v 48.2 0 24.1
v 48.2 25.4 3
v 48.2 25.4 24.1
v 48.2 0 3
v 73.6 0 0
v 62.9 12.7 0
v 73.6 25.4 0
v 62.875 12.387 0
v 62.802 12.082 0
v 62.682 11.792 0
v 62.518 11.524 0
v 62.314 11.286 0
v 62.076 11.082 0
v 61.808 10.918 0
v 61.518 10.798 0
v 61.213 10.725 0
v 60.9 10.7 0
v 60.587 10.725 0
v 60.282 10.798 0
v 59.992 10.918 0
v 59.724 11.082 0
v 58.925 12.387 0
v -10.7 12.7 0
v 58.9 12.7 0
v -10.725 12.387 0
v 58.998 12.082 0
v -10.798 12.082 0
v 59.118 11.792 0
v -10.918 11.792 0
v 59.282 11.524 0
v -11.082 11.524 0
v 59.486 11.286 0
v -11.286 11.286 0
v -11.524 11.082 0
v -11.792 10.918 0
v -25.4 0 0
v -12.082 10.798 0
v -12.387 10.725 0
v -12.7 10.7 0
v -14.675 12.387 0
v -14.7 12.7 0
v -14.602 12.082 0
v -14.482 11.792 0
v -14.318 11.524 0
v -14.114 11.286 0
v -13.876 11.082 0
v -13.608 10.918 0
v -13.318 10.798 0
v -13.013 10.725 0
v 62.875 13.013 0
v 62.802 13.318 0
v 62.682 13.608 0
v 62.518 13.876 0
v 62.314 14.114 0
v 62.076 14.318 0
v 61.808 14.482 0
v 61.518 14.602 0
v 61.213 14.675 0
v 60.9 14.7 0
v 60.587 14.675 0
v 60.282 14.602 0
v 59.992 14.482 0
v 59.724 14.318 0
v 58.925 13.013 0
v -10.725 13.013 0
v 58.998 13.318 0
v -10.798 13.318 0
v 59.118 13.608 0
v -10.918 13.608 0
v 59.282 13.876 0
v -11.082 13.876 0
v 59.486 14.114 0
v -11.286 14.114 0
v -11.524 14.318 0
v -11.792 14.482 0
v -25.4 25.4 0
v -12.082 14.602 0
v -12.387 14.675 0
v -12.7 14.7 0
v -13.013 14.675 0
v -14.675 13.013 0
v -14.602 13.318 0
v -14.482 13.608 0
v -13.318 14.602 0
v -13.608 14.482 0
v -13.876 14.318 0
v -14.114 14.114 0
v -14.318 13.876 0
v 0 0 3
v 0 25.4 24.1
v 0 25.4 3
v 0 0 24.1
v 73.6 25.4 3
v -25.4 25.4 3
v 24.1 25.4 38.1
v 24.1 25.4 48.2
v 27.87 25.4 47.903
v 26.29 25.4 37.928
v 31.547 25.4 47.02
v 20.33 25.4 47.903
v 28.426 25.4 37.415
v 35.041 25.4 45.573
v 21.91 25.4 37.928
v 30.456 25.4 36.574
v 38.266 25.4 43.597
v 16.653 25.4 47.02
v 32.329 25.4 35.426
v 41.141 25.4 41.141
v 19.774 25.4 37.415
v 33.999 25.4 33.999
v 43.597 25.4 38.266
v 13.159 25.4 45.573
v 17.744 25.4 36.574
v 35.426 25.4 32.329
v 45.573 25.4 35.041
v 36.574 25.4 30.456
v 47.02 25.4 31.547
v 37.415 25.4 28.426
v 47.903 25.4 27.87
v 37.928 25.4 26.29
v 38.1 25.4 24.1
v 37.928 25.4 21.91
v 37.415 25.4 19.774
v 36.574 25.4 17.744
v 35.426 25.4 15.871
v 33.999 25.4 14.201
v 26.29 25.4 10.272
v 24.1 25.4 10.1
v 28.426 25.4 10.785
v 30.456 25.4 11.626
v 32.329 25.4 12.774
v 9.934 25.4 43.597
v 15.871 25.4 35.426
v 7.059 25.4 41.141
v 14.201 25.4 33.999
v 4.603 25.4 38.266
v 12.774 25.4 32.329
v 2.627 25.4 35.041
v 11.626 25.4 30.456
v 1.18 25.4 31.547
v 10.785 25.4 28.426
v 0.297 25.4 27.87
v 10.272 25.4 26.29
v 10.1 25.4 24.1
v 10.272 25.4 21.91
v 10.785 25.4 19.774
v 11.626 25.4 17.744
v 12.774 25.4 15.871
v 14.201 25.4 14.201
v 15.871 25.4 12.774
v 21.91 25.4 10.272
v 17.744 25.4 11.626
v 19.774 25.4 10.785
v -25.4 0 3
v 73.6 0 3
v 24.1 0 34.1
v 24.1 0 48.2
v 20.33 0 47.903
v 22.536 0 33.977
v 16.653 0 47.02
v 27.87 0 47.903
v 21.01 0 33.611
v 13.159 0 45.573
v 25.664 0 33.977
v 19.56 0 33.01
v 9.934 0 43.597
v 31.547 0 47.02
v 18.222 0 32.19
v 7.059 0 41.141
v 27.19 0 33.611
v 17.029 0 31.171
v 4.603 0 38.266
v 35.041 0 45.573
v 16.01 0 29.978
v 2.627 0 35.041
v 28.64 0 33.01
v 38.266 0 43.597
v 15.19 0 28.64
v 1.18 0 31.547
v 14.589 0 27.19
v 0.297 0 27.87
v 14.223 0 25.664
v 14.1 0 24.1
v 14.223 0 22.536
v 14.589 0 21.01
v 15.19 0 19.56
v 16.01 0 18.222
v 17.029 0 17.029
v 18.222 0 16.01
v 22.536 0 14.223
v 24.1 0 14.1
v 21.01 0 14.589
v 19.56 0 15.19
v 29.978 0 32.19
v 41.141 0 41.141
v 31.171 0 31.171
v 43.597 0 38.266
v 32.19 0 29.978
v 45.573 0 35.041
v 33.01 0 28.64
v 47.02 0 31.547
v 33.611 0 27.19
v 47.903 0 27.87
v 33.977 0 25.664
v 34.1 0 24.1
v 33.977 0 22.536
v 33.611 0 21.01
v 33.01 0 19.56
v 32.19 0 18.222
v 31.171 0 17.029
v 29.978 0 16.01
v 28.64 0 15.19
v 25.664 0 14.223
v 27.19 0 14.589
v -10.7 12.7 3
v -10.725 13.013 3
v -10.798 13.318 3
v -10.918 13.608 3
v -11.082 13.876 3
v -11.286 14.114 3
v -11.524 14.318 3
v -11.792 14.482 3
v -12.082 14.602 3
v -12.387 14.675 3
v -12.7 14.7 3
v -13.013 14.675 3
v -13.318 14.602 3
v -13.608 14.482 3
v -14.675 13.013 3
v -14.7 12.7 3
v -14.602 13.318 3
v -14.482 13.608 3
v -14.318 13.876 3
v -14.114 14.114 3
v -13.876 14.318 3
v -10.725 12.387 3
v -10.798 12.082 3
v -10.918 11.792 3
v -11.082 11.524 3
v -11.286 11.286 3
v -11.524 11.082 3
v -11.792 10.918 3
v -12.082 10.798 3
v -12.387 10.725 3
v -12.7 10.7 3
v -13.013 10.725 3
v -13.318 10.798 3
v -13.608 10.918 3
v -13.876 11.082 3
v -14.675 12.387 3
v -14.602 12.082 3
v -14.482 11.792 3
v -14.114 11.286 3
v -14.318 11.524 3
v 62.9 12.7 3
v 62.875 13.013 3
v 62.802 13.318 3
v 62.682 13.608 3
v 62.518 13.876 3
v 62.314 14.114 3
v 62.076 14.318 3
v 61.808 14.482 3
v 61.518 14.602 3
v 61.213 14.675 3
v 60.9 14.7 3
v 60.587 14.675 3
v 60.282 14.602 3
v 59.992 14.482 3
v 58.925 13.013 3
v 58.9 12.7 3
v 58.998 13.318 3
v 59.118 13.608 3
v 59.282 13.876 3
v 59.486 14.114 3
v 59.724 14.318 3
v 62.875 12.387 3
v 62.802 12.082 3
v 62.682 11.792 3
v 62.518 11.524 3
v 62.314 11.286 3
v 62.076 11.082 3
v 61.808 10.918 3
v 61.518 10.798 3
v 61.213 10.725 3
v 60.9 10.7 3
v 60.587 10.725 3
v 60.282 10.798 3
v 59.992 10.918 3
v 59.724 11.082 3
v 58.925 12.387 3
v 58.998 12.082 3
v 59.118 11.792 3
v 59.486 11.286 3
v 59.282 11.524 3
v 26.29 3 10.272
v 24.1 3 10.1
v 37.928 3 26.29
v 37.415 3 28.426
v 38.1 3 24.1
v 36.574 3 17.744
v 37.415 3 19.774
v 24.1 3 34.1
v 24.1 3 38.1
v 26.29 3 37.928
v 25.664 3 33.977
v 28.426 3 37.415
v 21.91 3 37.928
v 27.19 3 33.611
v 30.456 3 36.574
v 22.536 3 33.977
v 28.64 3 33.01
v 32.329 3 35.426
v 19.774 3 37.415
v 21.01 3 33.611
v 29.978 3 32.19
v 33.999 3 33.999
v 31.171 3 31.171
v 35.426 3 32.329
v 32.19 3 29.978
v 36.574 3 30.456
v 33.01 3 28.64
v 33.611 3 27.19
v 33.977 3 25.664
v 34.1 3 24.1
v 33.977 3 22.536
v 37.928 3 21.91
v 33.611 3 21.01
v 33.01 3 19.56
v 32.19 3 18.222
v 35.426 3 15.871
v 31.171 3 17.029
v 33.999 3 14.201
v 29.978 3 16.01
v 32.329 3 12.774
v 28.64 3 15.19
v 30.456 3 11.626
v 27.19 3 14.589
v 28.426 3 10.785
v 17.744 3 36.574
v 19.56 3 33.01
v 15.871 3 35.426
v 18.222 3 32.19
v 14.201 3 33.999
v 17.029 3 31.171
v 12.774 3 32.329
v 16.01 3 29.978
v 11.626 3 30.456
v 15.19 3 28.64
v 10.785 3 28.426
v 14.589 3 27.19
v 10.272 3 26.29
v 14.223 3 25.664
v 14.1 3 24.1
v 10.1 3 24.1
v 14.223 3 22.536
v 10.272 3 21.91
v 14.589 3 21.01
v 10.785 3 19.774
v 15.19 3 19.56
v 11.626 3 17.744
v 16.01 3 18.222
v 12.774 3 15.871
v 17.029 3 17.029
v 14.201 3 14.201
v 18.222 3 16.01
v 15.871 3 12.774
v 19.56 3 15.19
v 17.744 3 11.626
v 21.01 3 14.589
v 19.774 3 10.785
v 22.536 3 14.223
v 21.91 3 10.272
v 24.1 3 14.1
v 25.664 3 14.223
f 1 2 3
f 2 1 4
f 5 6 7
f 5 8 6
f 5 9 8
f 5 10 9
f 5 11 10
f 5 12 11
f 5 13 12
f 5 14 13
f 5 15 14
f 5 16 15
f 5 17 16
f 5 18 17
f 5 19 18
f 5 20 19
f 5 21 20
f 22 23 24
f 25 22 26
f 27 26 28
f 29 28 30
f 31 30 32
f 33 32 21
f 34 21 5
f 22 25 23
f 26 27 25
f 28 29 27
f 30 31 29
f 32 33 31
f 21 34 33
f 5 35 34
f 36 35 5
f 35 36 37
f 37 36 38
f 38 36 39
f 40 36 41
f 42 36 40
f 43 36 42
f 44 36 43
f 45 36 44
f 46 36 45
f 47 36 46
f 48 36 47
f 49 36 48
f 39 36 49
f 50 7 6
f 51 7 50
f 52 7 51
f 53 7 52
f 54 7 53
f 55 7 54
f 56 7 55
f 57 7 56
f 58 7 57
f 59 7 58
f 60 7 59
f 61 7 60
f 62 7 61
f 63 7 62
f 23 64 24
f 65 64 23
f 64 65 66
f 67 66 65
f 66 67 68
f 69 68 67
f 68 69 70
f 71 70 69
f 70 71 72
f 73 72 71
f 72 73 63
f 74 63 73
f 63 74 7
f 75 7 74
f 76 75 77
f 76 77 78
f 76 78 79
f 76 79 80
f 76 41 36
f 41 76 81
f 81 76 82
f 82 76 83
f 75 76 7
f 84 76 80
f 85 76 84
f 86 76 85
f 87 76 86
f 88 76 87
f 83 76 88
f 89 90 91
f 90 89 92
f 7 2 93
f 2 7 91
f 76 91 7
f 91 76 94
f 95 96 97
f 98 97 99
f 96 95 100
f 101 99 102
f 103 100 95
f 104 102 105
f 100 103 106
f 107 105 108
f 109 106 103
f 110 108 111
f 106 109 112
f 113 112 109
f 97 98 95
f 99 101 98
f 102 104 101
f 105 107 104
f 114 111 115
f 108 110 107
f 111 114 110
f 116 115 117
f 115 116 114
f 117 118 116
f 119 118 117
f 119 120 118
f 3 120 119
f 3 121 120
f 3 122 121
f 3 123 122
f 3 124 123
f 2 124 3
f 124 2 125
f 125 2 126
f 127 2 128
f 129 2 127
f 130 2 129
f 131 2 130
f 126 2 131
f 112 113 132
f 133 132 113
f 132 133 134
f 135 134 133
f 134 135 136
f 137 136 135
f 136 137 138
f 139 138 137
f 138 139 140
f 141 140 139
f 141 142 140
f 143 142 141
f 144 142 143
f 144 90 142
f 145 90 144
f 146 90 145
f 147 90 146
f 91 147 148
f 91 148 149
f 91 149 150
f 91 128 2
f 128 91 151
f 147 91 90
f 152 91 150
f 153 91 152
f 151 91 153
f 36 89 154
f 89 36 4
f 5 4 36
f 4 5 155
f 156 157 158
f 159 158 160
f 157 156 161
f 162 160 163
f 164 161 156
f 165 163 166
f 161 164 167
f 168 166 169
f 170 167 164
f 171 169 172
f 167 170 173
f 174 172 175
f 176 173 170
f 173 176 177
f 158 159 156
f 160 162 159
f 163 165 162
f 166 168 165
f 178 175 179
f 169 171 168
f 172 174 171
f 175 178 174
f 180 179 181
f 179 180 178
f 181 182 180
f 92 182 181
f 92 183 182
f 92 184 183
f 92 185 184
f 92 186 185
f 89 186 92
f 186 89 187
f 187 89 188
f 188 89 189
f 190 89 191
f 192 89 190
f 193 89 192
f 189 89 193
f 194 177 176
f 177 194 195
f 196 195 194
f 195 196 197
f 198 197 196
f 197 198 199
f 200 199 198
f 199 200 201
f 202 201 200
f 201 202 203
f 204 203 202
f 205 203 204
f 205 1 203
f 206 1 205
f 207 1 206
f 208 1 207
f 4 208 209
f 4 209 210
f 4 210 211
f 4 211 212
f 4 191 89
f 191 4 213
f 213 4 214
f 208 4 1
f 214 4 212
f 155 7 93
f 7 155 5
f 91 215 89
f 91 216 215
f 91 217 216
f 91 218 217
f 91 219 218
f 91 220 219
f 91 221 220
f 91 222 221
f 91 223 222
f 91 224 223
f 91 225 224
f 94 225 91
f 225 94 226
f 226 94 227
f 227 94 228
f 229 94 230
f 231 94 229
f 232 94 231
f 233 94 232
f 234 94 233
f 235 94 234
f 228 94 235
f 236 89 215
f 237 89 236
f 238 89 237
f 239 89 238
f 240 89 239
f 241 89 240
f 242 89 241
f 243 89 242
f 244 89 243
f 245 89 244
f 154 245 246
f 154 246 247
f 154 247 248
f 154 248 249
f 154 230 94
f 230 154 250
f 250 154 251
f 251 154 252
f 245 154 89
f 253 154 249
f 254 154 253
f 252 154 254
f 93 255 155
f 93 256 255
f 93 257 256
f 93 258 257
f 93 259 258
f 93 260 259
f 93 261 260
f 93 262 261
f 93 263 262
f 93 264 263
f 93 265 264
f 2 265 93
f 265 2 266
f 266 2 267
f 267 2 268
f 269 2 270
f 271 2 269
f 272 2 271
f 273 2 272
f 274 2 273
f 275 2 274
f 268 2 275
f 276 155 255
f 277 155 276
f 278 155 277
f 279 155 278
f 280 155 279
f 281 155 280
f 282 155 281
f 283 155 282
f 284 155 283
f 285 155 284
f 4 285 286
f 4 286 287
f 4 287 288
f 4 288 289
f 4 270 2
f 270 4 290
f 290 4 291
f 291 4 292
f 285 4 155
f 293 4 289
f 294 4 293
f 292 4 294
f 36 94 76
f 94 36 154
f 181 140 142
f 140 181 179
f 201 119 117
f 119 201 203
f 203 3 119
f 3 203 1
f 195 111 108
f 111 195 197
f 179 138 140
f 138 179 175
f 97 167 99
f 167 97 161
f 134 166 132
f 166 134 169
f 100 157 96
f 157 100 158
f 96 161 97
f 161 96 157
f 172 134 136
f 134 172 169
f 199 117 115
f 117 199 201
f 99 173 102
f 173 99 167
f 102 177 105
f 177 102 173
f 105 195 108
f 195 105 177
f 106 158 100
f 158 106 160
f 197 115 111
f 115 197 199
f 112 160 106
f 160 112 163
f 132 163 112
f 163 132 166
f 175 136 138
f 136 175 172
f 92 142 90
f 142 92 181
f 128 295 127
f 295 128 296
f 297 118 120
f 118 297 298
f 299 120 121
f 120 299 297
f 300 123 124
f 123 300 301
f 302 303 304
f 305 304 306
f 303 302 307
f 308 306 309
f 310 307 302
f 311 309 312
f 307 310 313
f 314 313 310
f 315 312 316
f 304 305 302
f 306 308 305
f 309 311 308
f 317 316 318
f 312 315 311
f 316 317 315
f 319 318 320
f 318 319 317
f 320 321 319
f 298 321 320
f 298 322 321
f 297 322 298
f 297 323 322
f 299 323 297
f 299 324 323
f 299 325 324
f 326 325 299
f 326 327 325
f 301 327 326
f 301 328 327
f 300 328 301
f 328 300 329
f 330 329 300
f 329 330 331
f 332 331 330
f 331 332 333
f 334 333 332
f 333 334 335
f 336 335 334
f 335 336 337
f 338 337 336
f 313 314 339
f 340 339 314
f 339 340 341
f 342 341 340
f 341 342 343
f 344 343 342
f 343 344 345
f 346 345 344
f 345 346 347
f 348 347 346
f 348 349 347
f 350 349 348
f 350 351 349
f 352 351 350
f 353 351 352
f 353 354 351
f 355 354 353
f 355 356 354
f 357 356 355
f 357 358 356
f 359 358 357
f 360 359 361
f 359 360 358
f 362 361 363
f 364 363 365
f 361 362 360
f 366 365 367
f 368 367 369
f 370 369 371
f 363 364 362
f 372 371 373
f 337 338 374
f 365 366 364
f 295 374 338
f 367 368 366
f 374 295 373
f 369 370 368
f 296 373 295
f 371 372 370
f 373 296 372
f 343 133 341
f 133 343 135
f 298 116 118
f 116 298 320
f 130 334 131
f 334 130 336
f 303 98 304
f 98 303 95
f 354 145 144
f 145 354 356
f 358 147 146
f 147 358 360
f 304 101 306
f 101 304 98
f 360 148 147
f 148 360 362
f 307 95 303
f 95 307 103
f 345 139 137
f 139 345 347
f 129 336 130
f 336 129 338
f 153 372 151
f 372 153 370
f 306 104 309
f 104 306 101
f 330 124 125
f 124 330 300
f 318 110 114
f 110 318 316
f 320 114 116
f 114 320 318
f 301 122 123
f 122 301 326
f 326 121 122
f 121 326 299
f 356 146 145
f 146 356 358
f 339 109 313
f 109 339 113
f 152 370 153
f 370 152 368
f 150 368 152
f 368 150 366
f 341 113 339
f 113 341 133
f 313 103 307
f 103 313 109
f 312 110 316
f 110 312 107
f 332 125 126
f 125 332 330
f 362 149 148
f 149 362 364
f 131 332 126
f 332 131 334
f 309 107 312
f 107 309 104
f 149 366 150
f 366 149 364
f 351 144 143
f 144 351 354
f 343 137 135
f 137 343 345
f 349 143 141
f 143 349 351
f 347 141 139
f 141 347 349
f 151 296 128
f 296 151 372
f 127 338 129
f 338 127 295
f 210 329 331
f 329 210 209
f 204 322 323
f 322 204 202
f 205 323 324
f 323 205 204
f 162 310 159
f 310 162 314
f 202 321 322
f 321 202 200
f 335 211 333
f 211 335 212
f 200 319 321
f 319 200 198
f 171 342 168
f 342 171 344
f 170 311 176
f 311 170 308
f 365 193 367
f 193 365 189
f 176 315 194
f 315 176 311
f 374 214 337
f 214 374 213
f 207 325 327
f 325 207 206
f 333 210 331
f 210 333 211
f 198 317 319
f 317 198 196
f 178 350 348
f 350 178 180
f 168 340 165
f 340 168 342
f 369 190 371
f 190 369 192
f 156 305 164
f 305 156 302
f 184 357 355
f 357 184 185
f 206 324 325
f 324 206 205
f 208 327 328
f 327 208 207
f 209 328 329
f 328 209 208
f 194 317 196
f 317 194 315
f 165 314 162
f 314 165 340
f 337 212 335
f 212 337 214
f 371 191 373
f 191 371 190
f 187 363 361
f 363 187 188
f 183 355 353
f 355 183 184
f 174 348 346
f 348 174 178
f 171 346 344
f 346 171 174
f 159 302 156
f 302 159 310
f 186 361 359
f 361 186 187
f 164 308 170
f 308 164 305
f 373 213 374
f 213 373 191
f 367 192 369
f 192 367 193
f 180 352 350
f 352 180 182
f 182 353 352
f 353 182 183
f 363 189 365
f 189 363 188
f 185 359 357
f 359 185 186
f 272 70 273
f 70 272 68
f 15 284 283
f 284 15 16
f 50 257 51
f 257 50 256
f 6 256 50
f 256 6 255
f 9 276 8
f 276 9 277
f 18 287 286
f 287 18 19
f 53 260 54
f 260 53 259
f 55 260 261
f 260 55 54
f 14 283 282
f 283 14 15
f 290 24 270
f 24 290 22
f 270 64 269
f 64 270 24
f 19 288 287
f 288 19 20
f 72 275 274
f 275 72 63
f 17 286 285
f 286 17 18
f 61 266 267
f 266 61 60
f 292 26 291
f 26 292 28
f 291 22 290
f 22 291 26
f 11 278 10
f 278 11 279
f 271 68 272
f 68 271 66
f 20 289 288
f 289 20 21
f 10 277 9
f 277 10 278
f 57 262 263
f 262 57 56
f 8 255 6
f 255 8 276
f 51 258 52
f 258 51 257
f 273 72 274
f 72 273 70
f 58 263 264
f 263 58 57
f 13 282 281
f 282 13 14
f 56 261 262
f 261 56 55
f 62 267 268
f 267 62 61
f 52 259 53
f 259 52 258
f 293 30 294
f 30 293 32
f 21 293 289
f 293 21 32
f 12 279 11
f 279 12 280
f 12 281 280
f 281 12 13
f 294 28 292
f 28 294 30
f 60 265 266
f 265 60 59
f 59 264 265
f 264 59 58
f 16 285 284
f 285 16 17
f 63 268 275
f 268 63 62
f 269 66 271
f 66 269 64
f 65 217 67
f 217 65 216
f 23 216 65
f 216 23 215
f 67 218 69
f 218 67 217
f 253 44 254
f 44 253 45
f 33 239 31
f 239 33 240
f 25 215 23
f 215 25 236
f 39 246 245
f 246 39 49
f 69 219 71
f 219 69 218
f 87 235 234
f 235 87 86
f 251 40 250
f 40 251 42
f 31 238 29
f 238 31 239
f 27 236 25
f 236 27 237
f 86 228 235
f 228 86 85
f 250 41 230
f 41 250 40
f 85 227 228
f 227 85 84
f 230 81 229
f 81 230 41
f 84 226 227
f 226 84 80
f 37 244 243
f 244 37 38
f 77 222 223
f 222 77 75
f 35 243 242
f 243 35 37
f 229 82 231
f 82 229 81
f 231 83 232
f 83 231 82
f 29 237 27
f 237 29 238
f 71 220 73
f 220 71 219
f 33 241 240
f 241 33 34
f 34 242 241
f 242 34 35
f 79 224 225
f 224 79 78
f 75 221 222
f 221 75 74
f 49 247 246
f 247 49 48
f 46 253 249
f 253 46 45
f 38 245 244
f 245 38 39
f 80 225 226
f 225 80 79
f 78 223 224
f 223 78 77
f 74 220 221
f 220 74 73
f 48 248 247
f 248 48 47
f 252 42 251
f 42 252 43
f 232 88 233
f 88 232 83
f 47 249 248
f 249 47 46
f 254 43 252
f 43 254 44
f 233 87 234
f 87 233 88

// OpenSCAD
// preview[view:north west, tilt:top diagonal]
bearings_outer_radio = 14;
bearings_inner_radio = 10;
bracket_wall_width = 3;
bracket_depth = 25.4; // 1 inch
//lengths of tabs
bracket_flaps =  25.4;
bracket_bolts_diameter = 4; 
bracket_round_end = "yes"; //[yes,no]

module BearingForNemaCSG(nema_side, bearings_outer_radio, bearings_inner_radio)
{
	side = nema_side+bracket_wall_width*2;
	if (bracket_round_end=="yes")
	{

		difference()
		{
			translate( [-bracket_wall_width,-bracket_wall_width,nema_side/2]) 
				cube([side,bracket_depth,nema_side]);
	
			translate( [nema_side/2,bracket_depth/2-bracket_wall_width,nema_side/2]) 
				rotate(90,[1,0,0]) 
				{
					cylinder(r = side/2, h = bracket_depth, $fn = 40,center=true);
				}

		}
	}

	translate( [nema_side/2,bracket_depth/2,nema_side/2]) 
		rotate(90,[1,0,0]) 
		{
			cylinder(r = bearings_outer_radio, h = bracket_depth, $fn = 40,center=true);
		}

	translate( [nema_side/2,bracket_depth/2-bracket_wall_width,nema_side/2]) 
		rotate(90,[1,0,0]) 
		{
			cylinder(r = bearings_inner_radio, h = bracket_depth, $fn = 40,center=true);
		}

}


//units are in millimeters
M3 = 3.0/2.0;
nema17_side = 42.2;
nema17_bolts = 31.04;
nema17_depth = 33.8;
nema17_crown = 11;
nema17_bolt_radious = M3;

difference()
{
	union()
	{
		cube([nema17_side+bracket_wall_width*2, bracket_depth, nema17_side+bracket_wall_width*2]);

		translate([-bracket_flaps,0,0])
			cube([nema17_side+(bracket_wall_width+bracket_flaps)*2,bracket_depth,bracket_wall_width]);		
	}

	translate([bracket_wall_width + nema17_side + bracket_wall_width + bracket_flaps/2,bracket_depth/2,0])
		cylinder(r = bracket_bolts_diameter/2, h = 30, $fn = 40,center=true);

	translate([-bracket_flaps/2,bracket_depth/2,0])
		cylinder(r = bracket_bolts_diameter/2, h = 30, $fn = 40,center=true);


	translate([bracket_wall_width,bracket_wall_width,bracket_wall_width])


	BearingForNemaCSG(nema17_side, bearings_outer_radio, bearings_inner_radio);

}

	//BearingForNemaCSG(nema17_side, bearings_radio,bearings_radio/2);
